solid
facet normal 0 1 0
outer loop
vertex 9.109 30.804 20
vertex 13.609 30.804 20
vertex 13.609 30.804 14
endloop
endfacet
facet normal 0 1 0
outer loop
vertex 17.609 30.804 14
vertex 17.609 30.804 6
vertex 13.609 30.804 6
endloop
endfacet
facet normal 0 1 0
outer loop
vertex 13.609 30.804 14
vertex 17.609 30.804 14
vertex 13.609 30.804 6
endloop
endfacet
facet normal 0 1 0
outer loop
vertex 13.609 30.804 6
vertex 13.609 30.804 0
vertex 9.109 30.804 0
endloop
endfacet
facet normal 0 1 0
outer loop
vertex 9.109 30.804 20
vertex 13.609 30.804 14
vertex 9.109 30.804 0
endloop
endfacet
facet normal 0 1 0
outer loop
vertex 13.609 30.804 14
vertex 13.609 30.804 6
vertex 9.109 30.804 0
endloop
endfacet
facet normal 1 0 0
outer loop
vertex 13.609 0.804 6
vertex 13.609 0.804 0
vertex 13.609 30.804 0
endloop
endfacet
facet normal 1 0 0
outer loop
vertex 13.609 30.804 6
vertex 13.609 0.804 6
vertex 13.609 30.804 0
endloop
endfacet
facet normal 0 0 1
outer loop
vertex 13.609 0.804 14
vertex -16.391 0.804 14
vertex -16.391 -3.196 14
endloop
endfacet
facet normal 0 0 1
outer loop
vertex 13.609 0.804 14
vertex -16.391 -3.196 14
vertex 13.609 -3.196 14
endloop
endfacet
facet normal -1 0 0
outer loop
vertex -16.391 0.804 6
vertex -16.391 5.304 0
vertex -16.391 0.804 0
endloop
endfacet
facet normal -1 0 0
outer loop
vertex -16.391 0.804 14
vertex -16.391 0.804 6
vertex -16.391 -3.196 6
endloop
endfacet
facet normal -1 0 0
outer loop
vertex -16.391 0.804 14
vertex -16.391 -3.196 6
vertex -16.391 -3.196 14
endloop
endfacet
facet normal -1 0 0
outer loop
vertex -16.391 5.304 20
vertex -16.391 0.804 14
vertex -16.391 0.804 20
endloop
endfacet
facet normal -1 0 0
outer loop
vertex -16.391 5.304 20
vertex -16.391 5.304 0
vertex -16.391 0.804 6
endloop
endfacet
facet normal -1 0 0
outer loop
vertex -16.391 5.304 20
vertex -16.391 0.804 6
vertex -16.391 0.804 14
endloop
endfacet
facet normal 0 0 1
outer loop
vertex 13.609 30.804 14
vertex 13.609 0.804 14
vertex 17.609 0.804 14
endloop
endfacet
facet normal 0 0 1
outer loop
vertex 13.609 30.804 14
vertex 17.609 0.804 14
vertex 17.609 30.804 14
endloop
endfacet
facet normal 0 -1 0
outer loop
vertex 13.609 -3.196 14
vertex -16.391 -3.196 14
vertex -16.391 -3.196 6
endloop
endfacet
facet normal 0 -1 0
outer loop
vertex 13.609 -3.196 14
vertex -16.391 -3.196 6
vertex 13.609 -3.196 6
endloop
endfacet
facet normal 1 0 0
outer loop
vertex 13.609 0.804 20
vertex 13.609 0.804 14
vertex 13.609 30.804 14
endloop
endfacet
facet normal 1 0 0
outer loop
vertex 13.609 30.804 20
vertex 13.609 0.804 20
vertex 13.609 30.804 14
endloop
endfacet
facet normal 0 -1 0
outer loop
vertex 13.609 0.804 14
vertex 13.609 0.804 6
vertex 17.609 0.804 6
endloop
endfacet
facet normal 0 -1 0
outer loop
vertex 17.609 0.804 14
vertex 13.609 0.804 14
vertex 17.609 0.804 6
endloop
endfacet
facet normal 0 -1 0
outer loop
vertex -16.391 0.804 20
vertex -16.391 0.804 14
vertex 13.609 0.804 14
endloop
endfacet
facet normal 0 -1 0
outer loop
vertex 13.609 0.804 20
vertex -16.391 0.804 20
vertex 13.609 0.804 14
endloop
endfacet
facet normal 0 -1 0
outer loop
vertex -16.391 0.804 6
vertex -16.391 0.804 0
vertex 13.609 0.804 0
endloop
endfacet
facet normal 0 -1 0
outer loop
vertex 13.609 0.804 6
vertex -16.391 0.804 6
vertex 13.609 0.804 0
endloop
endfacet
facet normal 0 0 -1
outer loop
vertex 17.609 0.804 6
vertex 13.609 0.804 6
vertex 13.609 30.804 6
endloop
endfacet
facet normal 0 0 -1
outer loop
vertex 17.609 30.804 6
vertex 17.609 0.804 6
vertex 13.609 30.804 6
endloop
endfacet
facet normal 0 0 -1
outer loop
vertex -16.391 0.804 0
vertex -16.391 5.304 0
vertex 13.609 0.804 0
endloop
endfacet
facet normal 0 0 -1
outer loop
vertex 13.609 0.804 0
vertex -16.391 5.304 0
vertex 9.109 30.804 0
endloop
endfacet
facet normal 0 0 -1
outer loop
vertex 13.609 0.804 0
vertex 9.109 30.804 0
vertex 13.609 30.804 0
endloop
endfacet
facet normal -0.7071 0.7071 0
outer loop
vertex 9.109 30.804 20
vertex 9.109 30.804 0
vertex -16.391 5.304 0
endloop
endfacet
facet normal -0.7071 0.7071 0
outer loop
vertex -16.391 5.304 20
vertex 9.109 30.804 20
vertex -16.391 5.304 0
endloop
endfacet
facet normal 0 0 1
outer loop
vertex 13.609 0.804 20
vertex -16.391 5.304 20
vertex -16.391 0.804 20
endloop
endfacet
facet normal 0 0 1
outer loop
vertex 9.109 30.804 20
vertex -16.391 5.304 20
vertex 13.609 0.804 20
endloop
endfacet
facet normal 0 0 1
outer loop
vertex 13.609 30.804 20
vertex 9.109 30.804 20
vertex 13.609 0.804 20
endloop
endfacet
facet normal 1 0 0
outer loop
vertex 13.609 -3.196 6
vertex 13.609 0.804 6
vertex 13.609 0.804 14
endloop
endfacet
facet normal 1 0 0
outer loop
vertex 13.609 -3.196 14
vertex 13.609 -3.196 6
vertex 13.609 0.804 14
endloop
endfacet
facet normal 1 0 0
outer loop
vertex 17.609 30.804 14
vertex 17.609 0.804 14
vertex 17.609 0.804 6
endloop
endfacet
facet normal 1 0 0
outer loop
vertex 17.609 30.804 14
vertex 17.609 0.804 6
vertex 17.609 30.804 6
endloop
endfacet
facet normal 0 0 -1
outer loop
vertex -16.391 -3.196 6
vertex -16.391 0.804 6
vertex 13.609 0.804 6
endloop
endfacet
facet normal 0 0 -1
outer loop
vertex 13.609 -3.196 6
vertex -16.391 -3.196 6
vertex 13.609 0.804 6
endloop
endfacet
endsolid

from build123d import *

# Parameters (mm, degrees)
PAD_DEPTH    = 20
SKETCH001_W  = 30
SKETCH001_H  = 8
PAD001_DEPTH = 4
SKETCH002_W  = 30
SKETCH002_H  = 8
PAD002_DEPTH = 4


with BuildPart() as part:
    # Sketch → Pad (new body)
    with BuildSketch(Plane.XY):
        Polygon((9.109291, 30.803959), (-16.390709, 5.303959), (-16.390709, 0.803959), (13.609291, 0.803959), (13.609291, 30.803959), align=None)
    extrude(amount=PAD_DEPTH)

    # Sketch001 (on Face4 of Pad) → Pad001 (join)
    with BuildSketch(Plane.YZ.offset(13.609291)):
        with Locations((15.803959, 10)):
            Rectangle(SKETCH001_W, SKETCH001_H)
    extrude(amount=PAD001_DEPTH)

    # Sketch002 (on Face9 of Pad001) → Pad002 (join)
    with BuildSketch(Plane.XZ.offset(-0.803959)):
        with Locations((-1.390709, 10)):
            Rectangle(SKETCH002_W, SKETCH002_H)
    extrude(amount=PAD002_DEPTH)


solid = part.part
